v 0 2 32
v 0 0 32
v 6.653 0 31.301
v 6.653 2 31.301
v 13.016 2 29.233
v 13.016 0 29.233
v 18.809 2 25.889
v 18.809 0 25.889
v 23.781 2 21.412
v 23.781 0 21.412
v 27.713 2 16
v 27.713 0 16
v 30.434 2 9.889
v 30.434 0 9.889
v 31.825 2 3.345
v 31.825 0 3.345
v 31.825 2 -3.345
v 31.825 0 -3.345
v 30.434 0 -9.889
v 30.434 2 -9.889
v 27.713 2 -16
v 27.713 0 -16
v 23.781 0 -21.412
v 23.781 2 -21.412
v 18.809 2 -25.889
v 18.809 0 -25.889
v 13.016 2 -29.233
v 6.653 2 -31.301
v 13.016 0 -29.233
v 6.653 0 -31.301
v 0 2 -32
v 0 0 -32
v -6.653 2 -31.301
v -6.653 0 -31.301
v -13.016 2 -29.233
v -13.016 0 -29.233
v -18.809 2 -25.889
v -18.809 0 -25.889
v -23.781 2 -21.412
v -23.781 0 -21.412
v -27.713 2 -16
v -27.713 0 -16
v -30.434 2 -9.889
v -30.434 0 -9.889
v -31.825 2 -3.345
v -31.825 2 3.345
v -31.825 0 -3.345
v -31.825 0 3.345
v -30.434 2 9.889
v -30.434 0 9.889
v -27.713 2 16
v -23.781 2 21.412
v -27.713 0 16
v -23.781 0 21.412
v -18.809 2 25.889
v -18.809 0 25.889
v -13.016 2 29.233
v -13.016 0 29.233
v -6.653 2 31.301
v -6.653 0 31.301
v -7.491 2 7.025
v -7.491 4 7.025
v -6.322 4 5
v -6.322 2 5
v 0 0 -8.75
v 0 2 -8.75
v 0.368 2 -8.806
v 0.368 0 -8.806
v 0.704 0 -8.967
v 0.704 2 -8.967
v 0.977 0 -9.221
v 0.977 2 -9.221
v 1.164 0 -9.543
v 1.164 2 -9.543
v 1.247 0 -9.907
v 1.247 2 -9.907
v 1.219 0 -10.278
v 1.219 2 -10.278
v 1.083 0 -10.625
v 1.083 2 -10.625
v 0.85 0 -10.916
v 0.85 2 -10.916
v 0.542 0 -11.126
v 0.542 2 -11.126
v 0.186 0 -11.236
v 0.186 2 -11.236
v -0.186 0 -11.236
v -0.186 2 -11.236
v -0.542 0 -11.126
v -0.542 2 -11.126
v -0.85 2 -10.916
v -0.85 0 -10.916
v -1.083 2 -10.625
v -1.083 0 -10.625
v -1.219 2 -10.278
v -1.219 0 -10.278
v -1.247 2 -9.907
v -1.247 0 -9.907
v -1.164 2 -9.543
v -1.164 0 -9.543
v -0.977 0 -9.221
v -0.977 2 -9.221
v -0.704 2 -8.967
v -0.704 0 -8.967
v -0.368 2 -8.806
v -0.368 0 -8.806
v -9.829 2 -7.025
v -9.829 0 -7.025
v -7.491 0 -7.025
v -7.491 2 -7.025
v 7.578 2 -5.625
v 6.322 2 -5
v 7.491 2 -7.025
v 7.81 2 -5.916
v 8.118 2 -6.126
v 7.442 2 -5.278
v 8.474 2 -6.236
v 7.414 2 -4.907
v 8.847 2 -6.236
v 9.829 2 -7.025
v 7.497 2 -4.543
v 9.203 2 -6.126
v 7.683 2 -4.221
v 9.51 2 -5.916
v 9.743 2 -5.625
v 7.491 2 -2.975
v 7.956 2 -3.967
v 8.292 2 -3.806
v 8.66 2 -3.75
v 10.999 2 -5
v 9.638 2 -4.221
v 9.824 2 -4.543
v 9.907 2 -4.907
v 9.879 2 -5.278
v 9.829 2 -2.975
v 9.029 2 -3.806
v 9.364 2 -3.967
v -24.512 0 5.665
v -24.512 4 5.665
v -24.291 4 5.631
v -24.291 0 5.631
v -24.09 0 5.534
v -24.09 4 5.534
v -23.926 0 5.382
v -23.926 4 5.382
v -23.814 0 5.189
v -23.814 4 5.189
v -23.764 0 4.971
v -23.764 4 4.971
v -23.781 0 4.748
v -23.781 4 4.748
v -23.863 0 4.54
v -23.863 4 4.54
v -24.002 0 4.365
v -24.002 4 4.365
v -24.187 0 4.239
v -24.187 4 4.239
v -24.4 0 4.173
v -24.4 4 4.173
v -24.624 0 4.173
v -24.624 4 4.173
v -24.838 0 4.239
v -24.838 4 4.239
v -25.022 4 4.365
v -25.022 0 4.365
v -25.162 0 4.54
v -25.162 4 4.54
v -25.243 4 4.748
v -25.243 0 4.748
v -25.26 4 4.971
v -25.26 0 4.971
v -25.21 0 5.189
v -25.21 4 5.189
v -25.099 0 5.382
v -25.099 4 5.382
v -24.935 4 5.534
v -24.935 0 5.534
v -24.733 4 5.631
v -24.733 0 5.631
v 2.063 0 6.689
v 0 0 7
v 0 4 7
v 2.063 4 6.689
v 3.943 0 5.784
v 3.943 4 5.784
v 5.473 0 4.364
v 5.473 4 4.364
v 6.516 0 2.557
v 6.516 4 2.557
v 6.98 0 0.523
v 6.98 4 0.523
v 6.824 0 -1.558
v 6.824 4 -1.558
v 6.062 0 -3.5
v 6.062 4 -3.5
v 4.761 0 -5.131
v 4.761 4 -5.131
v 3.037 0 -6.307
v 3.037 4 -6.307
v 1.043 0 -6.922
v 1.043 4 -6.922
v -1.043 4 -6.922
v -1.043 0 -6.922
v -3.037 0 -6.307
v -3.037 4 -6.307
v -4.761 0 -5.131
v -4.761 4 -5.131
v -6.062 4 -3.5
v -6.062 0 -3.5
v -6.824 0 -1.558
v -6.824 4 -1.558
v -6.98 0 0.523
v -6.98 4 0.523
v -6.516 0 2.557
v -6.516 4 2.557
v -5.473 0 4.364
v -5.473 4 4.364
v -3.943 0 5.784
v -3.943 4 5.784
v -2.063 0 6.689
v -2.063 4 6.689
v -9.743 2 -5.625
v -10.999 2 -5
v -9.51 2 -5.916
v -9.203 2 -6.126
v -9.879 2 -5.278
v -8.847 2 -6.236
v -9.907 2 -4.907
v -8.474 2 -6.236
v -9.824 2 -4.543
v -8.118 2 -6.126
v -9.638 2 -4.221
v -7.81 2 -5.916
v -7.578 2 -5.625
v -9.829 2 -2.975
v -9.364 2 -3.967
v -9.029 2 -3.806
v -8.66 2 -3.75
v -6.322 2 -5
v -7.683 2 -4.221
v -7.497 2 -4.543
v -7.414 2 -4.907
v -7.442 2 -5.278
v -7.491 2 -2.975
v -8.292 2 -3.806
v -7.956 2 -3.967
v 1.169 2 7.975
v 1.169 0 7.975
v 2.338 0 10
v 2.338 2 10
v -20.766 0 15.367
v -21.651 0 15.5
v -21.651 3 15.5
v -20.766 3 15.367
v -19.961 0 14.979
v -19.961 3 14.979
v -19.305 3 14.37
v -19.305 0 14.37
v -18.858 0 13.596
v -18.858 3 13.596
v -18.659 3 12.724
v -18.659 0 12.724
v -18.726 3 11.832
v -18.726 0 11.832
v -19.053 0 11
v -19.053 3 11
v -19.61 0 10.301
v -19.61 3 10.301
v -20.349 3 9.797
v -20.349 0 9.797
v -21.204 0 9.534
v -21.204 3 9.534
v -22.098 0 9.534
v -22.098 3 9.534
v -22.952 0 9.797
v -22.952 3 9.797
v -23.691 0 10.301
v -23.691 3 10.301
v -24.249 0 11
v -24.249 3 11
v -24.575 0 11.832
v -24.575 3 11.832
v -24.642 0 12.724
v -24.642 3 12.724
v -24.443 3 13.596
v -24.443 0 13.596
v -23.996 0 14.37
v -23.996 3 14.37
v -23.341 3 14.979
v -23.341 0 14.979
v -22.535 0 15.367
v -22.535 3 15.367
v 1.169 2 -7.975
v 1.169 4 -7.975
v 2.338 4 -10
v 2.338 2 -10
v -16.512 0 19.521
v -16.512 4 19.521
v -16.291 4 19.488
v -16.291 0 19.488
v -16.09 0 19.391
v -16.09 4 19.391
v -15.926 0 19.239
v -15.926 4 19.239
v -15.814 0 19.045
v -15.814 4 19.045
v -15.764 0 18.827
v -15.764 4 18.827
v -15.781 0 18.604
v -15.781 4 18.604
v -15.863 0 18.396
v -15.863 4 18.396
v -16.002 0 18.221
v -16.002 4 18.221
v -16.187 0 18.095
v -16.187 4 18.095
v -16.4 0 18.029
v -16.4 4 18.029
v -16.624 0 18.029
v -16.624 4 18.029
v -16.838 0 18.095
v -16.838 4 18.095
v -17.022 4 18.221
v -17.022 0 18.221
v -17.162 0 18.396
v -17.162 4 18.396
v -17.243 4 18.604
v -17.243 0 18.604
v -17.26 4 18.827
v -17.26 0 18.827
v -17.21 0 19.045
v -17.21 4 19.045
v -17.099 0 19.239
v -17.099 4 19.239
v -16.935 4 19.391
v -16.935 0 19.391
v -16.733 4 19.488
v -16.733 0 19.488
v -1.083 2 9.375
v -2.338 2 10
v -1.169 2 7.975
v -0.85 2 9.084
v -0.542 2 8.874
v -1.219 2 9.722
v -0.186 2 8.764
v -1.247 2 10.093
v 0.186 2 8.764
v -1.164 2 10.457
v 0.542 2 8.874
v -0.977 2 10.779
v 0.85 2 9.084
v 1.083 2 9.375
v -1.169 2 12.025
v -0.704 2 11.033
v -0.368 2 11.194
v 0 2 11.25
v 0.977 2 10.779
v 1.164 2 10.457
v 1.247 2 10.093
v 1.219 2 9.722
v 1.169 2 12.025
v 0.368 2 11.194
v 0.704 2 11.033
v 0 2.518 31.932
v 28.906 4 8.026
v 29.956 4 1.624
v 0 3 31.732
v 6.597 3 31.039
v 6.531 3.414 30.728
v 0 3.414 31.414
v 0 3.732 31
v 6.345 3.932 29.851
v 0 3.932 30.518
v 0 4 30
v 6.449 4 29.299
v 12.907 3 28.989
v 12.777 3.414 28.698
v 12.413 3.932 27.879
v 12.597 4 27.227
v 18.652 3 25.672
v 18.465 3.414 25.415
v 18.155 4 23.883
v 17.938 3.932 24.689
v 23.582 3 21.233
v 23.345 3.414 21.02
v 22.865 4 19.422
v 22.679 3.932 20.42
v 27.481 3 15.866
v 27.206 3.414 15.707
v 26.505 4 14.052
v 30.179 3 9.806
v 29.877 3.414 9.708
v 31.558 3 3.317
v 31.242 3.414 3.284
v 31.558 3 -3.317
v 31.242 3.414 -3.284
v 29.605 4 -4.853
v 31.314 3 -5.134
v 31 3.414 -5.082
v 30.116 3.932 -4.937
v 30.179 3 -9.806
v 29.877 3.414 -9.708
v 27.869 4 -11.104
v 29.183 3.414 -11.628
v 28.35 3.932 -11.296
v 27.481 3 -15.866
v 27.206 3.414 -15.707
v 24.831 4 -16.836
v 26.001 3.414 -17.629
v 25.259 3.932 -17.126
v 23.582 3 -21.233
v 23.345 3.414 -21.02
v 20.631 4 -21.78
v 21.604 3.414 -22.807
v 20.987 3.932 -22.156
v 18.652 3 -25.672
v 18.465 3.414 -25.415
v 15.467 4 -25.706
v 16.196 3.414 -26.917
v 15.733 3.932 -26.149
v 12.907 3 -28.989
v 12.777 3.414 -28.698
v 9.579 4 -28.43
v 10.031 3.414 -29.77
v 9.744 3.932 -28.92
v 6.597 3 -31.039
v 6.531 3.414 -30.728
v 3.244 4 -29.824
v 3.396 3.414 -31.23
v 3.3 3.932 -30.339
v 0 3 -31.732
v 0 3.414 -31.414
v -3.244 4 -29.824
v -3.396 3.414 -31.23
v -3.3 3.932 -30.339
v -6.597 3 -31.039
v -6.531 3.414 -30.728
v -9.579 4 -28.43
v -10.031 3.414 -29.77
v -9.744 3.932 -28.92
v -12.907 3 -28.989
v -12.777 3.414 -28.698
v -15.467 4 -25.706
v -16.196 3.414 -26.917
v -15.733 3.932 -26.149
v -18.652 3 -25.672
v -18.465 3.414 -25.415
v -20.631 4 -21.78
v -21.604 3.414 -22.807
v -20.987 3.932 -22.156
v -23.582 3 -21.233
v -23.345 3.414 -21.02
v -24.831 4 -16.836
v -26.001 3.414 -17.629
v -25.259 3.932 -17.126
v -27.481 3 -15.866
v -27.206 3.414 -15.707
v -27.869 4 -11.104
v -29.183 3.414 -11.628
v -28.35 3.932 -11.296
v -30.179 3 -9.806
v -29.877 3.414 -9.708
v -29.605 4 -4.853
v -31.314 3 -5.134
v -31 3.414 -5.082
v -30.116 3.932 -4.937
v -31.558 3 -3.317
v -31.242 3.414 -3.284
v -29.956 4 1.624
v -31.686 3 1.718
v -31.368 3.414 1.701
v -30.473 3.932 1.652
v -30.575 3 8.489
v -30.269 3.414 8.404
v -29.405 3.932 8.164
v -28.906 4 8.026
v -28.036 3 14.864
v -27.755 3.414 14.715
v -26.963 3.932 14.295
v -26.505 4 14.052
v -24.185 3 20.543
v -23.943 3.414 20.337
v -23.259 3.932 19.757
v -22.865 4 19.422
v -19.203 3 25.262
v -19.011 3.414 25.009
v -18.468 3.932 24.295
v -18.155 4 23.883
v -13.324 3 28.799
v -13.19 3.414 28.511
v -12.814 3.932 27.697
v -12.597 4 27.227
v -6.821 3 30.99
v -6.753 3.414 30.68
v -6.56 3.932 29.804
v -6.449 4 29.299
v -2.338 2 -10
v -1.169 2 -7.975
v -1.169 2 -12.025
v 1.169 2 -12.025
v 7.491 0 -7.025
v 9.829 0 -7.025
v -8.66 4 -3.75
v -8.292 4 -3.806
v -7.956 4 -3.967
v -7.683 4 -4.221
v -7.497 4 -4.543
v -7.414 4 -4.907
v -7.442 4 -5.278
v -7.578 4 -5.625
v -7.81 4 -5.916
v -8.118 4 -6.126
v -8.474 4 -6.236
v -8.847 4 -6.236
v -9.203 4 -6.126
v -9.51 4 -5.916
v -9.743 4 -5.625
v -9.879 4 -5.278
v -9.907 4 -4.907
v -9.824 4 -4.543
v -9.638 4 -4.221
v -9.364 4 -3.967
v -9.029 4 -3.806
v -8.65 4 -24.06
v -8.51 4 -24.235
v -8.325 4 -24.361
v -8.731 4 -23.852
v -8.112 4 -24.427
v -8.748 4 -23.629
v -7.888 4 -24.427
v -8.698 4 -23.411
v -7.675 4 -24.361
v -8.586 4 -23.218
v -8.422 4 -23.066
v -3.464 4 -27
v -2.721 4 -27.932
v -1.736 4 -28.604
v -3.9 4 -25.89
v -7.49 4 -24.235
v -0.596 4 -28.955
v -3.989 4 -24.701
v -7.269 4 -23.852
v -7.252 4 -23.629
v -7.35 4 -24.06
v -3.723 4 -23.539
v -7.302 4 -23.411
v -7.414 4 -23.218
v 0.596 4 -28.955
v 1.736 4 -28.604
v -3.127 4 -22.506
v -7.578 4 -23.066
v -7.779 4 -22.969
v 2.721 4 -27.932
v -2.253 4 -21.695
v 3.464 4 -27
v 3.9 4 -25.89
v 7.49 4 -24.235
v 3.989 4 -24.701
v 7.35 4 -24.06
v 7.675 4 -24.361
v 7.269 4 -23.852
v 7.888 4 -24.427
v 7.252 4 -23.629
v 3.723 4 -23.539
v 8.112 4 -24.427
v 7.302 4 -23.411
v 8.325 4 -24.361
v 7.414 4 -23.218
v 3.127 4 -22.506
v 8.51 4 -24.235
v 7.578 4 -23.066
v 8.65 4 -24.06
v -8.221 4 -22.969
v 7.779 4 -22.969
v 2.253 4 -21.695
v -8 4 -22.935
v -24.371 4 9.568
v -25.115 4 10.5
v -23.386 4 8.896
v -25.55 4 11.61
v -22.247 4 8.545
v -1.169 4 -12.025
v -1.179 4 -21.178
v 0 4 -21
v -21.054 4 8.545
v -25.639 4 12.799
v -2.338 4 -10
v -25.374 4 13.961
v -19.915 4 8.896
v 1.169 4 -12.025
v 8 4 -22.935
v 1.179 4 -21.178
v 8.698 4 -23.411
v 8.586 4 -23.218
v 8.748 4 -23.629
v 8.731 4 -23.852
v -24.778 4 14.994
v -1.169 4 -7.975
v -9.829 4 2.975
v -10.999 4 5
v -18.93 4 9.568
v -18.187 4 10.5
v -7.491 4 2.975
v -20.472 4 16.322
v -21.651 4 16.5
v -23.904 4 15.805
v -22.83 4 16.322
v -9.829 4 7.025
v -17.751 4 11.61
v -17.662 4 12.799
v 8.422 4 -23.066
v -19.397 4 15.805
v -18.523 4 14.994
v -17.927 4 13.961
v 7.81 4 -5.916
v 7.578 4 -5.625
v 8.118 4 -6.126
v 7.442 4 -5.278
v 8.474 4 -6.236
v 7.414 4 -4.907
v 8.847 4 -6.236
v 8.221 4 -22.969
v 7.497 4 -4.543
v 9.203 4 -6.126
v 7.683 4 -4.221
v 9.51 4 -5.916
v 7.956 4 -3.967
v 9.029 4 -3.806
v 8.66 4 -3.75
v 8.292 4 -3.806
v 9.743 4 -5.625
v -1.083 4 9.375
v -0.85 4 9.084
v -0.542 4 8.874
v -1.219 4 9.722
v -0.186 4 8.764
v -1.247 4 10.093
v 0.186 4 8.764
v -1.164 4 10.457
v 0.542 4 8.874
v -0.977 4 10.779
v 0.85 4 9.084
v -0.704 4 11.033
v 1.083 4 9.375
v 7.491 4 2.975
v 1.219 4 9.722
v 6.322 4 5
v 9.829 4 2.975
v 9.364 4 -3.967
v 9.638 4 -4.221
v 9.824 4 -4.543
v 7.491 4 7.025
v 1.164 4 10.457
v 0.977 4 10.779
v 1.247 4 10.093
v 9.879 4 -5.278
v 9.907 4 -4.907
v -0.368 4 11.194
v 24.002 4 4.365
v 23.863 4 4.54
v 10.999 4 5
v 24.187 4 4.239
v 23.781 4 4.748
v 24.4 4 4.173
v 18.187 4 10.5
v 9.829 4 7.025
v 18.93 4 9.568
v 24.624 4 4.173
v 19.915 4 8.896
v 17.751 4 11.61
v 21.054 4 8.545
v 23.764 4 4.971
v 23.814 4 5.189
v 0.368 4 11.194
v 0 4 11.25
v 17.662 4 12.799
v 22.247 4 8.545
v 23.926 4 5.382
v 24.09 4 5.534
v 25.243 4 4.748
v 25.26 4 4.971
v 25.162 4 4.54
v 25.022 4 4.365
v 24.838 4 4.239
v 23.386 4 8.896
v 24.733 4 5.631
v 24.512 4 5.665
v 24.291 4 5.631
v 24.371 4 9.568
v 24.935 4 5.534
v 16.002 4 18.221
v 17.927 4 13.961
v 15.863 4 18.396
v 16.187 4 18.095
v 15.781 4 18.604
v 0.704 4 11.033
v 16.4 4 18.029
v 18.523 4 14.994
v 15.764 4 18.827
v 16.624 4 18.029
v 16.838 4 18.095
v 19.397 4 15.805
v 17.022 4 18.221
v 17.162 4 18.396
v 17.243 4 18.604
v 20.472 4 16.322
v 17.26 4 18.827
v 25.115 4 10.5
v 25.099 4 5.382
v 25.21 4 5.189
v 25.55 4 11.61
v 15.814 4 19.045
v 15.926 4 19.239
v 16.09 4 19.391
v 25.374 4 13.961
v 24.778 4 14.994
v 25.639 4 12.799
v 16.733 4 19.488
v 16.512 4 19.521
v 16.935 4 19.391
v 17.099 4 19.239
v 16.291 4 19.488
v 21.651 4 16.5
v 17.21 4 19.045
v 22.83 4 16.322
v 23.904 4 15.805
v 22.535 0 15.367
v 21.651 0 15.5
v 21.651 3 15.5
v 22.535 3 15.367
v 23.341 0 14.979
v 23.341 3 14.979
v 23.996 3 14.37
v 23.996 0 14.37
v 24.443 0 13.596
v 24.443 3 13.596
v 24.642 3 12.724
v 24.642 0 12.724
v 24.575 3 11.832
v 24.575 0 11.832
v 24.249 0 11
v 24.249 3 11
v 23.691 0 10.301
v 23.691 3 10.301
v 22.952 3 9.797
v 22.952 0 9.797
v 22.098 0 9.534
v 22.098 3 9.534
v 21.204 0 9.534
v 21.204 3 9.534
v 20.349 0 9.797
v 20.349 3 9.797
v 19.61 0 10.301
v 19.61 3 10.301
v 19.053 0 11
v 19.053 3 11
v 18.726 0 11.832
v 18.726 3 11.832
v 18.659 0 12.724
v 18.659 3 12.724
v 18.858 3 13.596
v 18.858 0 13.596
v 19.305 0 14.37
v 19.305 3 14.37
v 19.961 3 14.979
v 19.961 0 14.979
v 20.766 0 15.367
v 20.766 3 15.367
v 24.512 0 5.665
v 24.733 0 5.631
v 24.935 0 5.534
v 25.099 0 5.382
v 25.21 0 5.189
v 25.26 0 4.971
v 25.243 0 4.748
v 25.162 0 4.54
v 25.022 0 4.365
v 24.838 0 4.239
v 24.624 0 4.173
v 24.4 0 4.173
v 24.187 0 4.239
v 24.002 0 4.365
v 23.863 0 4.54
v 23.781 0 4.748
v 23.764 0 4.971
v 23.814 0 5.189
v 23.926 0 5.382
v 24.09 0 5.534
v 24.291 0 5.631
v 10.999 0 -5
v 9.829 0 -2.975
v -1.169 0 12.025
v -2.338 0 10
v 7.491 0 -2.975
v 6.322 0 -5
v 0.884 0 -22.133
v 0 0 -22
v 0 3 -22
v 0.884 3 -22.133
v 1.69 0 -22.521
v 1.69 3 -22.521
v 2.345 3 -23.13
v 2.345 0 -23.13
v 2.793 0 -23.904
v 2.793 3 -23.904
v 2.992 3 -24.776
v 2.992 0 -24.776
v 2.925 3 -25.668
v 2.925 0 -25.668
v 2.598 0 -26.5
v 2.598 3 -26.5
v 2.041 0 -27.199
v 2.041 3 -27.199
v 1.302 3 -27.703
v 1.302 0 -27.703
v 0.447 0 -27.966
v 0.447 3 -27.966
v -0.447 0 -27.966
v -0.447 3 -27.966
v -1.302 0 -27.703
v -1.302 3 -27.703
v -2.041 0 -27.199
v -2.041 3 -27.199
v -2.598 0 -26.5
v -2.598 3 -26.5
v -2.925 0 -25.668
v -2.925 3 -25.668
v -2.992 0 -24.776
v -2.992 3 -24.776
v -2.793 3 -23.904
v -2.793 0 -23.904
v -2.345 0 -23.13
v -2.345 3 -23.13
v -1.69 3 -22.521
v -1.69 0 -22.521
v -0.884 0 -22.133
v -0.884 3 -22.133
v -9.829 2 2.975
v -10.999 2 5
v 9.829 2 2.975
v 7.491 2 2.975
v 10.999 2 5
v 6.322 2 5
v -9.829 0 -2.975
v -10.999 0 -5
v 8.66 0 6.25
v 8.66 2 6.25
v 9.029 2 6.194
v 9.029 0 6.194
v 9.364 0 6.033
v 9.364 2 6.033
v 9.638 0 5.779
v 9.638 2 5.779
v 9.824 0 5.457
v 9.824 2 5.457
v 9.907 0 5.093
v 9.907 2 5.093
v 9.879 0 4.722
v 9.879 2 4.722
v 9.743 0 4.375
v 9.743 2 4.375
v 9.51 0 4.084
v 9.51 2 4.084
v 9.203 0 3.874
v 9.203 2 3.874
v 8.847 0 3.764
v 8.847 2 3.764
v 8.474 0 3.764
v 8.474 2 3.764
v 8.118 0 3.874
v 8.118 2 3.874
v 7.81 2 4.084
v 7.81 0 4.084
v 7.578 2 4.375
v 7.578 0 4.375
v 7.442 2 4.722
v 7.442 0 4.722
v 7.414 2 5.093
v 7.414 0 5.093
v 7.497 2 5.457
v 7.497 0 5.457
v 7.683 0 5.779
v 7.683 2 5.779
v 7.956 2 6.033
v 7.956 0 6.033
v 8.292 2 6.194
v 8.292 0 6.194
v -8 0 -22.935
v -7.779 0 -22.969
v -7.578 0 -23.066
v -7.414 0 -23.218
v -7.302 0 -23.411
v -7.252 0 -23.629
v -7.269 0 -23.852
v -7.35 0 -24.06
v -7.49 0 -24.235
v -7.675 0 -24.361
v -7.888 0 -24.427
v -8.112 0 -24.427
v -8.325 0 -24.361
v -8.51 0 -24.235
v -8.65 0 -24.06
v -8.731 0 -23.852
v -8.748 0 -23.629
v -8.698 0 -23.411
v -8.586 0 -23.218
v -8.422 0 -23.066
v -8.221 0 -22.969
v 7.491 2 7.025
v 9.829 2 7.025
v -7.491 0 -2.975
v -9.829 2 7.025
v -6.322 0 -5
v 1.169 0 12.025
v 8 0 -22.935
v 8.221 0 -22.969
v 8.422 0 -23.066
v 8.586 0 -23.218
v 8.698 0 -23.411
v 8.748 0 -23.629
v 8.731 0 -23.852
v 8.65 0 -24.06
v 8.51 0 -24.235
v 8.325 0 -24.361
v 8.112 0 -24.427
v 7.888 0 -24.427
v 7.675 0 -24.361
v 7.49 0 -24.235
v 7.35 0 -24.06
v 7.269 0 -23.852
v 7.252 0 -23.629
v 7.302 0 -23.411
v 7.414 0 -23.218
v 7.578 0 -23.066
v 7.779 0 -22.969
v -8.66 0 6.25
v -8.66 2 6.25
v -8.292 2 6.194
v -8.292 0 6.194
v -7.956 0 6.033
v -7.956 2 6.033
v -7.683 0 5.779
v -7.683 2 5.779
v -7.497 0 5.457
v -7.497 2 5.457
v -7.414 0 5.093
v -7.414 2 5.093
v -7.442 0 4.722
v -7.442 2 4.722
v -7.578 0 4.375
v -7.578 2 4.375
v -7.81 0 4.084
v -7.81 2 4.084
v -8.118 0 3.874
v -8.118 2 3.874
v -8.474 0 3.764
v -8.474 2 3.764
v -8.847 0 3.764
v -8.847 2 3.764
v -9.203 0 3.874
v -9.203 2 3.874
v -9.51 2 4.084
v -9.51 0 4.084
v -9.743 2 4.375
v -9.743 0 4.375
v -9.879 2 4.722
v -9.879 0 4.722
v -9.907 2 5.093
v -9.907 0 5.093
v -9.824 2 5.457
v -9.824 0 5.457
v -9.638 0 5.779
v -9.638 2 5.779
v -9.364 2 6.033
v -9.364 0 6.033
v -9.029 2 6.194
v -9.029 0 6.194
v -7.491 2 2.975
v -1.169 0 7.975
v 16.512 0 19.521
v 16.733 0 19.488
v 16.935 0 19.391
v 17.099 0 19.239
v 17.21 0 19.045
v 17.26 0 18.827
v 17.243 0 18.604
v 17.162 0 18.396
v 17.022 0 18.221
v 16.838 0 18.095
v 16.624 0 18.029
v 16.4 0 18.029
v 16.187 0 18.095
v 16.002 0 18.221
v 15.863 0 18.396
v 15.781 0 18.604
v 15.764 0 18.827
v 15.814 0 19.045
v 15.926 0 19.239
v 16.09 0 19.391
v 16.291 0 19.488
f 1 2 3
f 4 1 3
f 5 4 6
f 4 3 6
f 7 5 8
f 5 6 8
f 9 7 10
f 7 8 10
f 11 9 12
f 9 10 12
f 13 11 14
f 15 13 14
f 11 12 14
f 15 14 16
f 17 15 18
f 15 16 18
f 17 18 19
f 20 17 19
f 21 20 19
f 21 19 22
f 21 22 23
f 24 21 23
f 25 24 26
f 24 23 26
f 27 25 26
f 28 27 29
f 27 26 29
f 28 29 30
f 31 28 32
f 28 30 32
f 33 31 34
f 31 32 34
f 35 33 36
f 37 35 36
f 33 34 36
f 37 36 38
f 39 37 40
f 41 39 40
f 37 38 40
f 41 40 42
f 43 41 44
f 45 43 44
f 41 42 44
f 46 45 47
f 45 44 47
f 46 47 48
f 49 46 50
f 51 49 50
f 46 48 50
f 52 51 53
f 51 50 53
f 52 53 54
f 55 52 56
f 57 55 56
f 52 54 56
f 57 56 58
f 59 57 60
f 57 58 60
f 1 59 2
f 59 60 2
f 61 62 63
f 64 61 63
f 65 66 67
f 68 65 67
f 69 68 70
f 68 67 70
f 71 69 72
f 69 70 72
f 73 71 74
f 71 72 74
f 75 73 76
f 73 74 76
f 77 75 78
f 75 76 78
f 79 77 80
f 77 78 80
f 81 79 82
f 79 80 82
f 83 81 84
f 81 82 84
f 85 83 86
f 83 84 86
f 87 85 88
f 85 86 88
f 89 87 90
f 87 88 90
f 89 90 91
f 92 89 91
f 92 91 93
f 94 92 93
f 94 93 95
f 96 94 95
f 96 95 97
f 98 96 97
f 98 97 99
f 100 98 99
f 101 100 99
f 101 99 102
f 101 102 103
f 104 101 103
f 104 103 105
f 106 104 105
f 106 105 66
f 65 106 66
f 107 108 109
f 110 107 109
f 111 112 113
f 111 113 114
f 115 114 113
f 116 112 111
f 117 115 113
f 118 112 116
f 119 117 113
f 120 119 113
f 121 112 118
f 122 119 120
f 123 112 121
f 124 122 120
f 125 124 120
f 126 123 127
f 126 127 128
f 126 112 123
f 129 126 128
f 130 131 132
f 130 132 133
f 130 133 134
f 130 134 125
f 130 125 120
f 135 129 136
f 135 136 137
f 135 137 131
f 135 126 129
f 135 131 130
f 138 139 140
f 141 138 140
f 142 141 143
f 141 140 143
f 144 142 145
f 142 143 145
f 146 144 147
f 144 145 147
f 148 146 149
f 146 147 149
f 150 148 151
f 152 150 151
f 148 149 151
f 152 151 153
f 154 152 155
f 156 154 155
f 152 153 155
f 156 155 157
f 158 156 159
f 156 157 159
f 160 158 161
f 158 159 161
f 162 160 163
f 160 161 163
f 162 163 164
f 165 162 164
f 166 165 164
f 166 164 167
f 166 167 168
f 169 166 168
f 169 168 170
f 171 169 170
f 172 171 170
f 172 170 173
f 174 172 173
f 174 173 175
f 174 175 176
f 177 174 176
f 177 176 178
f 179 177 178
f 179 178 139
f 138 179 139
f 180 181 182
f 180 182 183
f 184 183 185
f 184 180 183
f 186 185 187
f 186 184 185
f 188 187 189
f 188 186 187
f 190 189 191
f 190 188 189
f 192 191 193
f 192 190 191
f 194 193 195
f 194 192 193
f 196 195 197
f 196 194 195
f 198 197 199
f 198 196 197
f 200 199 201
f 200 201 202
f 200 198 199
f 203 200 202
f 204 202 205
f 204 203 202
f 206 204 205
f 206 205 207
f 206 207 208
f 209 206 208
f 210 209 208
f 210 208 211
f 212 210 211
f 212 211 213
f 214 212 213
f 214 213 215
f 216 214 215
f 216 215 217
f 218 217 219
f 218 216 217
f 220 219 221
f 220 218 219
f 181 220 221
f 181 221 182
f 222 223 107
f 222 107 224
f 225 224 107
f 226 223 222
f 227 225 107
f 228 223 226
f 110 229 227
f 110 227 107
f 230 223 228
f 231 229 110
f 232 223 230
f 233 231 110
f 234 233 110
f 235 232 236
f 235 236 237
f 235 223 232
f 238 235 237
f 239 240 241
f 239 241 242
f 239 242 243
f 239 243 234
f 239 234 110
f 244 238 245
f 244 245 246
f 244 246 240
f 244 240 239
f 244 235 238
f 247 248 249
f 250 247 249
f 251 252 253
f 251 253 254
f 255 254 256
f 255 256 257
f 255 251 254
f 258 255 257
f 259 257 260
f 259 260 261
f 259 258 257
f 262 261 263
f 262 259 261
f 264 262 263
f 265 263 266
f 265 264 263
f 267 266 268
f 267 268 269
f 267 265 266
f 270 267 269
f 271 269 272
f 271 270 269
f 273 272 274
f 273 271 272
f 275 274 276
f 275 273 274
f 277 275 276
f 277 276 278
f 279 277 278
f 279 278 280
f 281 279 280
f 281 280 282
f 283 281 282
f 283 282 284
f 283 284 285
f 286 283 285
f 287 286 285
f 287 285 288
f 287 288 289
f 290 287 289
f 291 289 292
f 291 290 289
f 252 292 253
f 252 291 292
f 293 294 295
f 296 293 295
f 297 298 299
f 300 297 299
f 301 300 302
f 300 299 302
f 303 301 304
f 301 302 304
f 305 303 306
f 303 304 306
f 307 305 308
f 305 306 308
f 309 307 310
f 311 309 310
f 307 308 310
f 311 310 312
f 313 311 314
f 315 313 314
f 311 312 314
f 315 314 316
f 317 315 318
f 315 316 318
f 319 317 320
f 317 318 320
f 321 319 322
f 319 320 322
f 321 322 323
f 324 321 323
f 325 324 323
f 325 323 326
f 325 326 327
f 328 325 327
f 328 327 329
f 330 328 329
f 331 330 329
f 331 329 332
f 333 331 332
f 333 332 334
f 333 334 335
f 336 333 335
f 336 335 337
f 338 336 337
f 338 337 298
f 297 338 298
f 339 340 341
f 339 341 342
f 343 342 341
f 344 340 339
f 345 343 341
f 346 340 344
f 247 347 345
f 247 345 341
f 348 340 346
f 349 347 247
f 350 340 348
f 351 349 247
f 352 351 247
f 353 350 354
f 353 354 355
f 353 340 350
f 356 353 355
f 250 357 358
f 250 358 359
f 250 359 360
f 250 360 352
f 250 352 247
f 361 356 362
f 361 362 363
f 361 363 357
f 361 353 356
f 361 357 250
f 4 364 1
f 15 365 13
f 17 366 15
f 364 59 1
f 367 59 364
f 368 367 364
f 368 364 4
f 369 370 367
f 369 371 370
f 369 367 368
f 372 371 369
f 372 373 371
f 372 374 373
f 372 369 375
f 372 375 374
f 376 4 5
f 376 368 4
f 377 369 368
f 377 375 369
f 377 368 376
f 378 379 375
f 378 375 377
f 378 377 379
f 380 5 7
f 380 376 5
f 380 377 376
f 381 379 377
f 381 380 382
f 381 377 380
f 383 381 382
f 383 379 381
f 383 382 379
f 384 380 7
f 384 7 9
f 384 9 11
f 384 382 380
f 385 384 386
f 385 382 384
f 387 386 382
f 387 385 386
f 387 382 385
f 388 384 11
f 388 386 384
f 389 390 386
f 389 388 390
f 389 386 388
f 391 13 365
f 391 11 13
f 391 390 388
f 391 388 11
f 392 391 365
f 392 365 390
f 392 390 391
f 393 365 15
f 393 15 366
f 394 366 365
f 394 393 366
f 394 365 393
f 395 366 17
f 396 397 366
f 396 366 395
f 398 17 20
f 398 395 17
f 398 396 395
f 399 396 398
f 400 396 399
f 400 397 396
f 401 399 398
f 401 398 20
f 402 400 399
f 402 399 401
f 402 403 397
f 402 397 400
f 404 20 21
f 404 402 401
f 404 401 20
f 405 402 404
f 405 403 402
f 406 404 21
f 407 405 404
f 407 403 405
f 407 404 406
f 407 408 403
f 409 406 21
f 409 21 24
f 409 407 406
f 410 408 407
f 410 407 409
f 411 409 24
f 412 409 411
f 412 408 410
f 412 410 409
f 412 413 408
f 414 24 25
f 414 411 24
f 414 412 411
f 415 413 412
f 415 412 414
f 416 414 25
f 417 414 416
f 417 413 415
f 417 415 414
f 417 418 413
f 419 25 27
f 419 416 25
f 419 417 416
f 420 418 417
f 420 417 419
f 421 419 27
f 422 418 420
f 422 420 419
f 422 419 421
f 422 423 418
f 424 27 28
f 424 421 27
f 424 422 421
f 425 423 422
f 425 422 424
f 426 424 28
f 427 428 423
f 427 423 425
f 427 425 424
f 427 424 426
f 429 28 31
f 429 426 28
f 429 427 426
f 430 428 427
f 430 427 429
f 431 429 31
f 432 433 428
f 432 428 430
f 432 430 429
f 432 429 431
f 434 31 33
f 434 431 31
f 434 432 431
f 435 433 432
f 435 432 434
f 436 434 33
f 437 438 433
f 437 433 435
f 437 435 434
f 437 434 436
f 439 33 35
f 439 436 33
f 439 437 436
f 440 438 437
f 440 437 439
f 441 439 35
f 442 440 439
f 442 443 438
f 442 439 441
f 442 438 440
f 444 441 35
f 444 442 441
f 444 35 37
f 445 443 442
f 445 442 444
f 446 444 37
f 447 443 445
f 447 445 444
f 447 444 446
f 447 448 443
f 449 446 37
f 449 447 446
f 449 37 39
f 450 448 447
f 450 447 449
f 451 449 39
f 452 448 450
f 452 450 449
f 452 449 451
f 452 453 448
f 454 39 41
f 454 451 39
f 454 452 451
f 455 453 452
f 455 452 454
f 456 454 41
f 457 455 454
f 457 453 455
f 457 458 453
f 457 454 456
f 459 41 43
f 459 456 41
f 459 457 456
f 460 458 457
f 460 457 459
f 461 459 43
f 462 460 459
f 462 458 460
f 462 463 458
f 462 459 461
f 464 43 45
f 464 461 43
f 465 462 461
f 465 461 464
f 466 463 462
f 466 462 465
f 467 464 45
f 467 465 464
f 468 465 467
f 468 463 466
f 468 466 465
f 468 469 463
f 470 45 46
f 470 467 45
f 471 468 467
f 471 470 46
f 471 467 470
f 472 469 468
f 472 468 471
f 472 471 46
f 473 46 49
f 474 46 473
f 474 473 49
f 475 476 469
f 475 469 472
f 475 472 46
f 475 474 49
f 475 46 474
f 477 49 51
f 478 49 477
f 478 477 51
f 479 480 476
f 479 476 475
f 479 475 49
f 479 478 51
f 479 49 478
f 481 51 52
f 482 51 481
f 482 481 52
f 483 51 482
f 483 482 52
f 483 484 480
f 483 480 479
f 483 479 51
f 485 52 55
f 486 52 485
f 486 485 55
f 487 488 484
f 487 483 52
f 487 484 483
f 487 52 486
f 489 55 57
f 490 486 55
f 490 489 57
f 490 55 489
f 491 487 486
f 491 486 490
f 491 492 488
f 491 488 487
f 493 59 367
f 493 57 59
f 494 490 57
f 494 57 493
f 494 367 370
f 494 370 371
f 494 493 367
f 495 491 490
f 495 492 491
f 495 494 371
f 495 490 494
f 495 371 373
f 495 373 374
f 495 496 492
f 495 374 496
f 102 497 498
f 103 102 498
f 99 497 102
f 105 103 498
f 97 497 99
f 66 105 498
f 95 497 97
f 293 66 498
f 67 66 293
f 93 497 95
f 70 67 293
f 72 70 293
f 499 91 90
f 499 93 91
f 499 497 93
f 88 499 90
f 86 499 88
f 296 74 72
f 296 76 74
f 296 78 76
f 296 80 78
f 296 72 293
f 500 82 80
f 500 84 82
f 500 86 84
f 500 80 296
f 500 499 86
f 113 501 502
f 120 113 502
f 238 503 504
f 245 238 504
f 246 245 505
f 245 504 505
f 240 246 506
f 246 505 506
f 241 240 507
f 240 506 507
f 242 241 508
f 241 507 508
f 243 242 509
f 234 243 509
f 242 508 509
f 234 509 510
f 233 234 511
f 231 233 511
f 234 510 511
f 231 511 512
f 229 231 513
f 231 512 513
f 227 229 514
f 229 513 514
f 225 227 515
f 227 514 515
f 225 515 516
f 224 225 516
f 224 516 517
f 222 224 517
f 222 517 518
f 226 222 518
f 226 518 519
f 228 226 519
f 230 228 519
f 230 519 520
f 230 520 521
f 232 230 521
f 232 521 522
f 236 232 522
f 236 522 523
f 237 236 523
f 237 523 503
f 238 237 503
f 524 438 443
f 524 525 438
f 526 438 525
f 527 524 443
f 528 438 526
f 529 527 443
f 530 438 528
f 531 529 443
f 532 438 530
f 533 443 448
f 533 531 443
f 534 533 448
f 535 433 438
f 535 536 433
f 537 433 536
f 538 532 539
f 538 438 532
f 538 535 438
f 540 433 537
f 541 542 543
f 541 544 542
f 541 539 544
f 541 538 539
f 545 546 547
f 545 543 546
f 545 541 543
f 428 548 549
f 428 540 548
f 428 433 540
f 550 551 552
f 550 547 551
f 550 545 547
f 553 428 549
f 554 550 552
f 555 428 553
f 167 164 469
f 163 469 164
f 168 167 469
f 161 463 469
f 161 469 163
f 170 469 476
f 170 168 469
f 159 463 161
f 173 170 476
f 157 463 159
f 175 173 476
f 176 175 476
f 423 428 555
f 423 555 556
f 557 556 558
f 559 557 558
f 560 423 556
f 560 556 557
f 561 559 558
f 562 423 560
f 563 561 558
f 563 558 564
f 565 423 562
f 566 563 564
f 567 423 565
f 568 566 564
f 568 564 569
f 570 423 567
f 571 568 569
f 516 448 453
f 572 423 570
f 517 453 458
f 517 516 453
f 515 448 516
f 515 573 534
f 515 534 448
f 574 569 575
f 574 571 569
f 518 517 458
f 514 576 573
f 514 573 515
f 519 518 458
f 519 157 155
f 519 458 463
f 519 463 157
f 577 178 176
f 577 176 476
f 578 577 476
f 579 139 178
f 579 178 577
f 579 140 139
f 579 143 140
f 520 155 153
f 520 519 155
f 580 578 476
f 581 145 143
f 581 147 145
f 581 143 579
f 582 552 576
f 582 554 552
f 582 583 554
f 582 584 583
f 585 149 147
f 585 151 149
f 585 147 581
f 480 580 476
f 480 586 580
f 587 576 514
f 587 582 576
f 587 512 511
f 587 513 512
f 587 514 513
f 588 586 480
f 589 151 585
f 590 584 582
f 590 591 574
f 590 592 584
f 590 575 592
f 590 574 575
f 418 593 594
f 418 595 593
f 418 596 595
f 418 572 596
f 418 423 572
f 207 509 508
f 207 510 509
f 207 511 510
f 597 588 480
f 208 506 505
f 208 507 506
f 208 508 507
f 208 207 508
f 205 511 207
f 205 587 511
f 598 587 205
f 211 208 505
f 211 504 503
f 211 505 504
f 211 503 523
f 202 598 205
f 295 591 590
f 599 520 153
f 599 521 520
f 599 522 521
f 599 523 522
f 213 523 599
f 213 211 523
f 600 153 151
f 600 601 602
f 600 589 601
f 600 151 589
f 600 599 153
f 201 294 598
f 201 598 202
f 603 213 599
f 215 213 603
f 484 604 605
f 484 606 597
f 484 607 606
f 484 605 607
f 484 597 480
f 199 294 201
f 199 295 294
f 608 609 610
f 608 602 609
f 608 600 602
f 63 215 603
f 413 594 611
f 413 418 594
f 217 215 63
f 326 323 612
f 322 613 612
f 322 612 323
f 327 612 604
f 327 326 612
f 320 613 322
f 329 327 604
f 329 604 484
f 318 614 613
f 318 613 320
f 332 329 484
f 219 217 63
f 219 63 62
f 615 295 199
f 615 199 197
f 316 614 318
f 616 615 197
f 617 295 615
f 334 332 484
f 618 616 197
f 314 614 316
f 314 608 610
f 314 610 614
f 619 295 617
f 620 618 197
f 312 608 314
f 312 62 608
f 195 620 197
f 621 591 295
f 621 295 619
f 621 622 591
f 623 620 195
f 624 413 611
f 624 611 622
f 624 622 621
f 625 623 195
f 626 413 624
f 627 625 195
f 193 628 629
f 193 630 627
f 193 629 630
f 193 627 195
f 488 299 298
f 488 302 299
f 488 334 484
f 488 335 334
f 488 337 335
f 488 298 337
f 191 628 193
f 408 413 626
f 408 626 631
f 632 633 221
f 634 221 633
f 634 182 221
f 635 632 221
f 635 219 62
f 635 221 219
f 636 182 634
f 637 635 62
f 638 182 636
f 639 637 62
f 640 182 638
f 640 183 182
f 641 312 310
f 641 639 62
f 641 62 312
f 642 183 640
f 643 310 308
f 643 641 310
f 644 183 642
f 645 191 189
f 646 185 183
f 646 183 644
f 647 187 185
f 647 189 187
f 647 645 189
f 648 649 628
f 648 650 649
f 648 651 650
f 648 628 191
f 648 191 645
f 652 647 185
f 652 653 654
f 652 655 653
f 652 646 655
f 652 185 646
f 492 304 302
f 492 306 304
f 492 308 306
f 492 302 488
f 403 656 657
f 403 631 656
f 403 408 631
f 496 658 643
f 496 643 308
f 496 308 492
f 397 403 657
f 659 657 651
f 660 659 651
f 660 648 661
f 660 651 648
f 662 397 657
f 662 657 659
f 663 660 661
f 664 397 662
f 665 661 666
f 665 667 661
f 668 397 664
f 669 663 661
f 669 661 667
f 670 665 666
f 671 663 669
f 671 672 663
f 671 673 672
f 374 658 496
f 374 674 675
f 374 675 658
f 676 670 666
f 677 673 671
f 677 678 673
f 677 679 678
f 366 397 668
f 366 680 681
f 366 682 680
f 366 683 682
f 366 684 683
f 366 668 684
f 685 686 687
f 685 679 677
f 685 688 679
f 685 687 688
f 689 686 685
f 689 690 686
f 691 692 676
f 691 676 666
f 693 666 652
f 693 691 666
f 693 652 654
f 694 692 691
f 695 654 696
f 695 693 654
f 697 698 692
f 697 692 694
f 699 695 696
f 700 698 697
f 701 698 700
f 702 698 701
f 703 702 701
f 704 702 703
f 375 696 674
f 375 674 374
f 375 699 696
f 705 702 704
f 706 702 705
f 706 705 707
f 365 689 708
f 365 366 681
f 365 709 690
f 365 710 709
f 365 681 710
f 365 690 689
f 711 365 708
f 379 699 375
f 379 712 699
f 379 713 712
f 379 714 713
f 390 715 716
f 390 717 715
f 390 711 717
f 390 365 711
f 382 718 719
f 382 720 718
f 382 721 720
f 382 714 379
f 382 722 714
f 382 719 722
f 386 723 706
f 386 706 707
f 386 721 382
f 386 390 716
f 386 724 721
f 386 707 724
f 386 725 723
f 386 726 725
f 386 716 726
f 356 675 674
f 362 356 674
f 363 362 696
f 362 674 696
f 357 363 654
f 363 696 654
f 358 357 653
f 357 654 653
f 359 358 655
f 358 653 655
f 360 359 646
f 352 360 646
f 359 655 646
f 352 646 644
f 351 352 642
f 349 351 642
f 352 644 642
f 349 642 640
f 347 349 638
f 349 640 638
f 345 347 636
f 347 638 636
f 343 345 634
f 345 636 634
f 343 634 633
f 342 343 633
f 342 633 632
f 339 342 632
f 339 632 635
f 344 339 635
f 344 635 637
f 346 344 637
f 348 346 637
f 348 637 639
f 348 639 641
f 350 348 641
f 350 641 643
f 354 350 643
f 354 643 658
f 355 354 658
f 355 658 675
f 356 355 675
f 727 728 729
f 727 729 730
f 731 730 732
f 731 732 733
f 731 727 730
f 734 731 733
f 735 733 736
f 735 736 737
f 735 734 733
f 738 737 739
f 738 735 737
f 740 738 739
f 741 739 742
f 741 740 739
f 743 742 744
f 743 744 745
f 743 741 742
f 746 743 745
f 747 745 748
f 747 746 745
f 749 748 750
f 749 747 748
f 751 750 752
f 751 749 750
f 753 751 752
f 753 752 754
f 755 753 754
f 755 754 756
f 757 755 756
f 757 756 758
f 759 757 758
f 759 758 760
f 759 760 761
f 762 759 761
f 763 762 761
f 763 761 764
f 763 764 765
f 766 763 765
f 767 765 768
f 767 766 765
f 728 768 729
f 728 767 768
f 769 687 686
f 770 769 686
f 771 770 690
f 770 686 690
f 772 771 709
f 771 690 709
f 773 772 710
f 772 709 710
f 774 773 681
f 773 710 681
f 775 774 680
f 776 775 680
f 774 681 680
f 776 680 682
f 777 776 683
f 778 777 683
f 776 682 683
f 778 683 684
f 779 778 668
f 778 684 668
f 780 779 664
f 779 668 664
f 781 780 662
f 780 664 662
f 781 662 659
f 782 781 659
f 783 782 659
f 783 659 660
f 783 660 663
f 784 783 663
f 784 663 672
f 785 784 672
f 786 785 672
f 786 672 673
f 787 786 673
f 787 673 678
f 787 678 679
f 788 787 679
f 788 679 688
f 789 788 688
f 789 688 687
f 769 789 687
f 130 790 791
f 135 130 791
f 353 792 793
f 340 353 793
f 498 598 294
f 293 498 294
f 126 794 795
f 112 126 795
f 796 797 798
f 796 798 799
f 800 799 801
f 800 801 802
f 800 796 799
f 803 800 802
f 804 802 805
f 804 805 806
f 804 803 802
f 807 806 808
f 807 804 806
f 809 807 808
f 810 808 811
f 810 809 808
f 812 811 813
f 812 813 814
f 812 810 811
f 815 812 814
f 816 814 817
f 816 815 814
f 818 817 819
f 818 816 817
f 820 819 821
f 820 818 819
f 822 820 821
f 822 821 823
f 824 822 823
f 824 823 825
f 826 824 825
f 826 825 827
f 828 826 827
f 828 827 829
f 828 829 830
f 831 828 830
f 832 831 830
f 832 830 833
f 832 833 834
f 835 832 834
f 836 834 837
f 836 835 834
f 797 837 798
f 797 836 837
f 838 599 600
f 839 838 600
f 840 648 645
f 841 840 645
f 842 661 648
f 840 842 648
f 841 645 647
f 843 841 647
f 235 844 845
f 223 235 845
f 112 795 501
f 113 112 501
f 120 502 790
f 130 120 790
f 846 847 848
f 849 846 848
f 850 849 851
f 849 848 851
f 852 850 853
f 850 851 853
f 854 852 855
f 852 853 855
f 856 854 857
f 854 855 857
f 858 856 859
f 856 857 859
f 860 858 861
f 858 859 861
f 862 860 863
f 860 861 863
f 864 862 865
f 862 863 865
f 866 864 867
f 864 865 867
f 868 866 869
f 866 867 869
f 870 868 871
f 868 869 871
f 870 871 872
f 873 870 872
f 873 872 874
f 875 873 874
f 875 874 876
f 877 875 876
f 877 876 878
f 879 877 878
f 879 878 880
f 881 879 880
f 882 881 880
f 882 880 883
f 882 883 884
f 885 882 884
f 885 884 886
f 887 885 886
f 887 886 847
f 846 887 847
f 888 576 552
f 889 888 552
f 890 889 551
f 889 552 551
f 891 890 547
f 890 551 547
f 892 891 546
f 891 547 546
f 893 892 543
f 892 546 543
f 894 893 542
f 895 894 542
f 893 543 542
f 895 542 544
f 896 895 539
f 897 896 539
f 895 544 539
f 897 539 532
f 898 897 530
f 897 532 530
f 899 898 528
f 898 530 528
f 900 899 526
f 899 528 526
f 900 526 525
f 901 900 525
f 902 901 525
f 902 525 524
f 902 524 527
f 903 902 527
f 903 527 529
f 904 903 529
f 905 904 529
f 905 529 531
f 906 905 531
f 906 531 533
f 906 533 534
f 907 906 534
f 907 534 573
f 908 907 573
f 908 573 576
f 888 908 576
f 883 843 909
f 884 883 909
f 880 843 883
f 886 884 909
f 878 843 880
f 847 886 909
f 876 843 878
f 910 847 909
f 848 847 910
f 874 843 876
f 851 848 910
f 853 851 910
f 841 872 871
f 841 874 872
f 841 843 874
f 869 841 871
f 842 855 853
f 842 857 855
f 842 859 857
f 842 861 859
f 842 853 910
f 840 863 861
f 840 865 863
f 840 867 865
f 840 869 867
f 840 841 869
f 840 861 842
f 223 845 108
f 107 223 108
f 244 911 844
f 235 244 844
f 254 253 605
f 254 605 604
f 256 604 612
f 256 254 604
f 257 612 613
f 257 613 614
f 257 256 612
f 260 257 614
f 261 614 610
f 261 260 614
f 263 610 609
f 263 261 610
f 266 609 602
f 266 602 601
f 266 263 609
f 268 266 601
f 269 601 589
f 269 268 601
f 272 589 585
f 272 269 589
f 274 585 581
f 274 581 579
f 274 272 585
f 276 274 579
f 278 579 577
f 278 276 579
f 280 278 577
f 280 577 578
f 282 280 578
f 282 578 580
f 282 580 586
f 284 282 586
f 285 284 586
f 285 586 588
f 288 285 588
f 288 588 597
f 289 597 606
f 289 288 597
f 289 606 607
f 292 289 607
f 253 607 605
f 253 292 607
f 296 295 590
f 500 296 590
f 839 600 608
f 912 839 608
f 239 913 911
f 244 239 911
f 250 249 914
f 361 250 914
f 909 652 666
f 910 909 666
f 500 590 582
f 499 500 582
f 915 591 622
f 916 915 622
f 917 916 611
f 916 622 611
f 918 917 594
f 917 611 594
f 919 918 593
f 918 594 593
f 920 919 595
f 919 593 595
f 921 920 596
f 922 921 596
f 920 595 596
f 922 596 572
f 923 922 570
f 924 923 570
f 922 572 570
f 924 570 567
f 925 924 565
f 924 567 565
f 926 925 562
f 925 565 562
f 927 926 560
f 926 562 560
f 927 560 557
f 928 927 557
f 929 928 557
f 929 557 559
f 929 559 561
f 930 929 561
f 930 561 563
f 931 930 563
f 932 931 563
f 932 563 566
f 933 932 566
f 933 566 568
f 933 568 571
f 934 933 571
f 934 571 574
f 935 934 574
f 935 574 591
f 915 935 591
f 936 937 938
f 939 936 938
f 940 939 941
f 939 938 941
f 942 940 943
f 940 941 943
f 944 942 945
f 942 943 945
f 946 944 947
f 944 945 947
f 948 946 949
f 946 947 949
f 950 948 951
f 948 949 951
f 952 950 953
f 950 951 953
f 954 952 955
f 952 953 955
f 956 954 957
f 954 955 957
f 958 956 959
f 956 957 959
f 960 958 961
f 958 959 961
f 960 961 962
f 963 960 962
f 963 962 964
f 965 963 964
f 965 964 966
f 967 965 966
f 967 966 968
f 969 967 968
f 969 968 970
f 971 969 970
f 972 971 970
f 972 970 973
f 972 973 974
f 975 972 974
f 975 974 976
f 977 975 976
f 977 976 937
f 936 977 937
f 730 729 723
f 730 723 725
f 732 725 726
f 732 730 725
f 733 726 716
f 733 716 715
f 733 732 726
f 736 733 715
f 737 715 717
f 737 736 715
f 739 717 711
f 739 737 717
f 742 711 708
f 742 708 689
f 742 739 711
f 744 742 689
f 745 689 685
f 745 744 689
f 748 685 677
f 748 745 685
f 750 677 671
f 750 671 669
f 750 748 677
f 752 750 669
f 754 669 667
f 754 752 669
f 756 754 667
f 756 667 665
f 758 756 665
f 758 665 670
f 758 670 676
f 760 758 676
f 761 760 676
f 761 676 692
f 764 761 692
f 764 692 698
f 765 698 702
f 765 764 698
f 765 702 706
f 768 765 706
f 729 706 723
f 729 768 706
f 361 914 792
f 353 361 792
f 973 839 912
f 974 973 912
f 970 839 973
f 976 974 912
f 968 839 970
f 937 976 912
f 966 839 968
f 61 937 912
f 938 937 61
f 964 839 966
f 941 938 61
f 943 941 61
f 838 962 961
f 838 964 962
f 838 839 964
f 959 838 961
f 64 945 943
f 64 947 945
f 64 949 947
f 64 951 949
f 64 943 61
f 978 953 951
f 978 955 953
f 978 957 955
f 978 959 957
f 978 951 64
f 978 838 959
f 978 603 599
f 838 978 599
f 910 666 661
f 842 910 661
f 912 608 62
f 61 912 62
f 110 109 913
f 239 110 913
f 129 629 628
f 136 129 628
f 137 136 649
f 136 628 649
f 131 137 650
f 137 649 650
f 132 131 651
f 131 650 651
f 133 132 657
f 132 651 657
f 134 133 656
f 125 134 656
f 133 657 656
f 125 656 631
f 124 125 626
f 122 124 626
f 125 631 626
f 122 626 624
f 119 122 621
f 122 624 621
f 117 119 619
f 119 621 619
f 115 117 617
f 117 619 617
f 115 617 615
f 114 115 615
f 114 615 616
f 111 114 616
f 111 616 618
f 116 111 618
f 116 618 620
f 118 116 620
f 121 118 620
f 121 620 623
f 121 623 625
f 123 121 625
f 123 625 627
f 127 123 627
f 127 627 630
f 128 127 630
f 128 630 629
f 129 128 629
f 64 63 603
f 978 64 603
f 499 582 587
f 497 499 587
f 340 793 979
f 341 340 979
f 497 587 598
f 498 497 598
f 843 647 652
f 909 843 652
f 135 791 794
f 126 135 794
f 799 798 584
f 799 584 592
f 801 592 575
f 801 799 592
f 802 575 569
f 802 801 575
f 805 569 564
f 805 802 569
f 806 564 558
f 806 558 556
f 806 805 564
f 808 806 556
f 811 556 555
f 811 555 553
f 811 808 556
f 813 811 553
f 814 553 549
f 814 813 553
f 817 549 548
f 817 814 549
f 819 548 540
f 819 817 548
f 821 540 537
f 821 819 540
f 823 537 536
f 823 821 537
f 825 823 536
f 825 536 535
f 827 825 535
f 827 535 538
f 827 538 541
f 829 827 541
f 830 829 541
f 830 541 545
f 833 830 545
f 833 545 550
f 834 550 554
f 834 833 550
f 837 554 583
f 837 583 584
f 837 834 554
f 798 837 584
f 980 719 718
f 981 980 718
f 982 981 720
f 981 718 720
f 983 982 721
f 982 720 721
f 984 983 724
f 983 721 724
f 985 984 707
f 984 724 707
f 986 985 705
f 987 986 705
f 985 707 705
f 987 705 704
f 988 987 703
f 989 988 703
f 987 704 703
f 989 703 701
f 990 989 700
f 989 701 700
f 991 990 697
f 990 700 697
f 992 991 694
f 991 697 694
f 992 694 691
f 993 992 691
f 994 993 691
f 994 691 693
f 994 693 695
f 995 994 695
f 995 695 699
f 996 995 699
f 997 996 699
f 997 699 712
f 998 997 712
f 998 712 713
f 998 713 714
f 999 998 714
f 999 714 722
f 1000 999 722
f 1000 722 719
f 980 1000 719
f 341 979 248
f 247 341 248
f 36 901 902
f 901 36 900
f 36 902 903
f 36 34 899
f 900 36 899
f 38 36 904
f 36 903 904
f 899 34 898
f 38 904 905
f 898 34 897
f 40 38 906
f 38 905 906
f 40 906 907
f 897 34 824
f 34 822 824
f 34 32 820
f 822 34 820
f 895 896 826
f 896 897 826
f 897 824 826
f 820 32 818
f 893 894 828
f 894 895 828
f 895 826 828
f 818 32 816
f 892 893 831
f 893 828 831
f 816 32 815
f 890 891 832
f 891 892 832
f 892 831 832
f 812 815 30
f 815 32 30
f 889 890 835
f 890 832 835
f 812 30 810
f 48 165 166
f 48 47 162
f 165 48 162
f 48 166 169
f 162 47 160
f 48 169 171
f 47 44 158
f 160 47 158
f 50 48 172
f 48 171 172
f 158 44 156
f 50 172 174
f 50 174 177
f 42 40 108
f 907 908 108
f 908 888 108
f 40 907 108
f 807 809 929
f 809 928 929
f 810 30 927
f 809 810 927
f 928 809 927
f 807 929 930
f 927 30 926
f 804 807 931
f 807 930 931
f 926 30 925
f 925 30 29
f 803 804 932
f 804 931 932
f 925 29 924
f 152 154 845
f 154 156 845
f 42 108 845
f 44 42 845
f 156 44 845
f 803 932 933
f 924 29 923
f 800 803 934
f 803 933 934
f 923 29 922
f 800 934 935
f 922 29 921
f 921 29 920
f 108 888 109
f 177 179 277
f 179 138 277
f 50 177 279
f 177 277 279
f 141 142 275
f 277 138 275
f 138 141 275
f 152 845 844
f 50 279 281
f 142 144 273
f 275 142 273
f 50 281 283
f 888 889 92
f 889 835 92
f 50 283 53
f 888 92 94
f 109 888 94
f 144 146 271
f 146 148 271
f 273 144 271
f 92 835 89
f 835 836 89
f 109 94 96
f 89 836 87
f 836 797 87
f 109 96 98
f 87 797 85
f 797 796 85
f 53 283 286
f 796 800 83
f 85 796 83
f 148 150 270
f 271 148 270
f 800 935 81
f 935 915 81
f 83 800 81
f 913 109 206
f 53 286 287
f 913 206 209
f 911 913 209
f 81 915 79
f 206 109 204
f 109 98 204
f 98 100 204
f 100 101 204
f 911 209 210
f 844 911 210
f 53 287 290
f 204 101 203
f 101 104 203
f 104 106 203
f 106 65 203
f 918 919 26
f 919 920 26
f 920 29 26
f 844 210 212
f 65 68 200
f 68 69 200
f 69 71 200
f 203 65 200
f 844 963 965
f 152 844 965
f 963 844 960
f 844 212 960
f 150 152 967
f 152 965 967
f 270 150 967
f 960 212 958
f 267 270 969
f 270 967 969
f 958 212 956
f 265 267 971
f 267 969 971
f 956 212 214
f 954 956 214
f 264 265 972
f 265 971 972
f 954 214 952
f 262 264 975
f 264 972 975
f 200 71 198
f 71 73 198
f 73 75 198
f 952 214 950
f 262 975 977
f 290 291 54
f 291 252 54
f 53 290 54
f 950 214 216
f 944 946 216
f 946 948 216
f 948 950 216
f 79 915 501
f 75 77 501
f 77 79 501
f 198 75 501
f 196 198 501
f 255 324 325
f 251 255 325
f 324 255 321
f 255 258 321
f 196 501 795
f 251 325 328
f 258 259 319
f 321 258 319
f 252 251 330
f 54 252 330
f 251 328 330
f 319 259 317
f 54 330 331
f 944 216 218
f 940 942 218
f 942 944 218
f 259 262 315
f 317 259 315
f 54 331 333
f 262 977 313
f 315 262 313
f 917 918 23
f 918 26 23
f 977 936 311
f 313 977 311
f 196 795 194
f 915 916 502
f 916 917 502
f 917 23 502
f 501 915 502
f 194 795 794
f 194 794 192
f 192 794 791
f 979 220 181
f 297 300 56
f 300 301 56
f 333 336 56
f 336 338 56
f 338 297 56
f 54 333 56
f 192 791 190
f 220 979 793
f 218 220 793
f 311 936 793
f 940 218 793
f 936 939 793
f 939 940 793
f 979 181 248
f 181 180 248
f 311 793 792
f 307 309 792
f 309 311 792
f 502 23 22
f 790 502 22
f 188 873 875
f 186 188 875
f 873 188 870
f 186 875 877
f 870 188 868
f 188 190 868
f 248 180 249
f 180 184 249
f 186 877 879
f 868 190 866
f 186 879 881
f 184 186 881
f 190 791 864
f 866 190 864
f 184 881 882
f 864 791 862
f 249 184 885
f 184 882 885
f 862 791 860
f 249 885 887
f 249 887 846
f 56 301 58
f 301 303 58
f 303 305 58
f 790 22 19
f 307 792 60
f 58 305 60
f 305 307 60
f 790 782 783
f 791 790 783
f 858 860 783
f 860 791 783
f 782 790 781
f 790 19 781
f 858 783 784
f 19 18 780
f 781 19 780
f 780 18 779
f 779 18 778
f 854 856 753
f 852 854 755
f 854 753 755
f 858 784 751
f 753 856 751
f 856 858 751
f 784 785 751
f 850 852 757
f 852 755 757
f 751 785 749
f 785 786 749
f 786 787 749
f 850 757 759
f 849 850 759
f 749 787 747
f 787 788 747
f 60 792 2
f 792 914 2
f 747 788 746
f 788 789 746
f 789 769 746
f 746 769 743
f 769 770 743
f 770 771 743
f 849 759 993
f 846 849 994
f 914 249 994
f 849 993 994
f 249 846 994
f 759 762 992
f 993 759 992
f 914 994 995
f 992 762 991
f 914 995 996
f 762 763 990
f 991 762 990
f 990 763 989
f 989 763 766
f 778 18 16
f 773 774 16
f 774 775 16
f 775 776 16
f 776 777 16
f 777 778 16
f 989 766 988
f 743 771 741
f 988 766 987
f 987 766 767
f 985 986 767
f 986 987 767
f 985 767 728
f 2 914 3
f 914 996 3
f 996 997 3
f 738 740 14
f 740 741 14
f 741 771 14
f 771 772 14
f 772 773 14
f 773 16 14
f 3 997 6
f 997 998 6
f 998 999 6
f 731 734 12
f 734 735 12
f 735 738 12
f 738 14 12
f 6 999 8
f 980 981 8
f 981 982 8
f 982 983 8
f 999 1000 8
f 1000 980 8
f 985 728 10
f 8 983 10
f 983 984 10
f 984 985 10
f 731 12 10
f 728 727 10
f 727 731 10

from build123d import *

# Parameters (mm, degrees)
SKETCH_1_R          = 32
SKETCH_1_R_2        = 7
SKETCH_1_R_3        = 3
EXTRUDE_1_DEPTH     = 4
FILLET_1_R          = 2
SKETCH_2_R          = 1.25
CUT_EXTRUDE_1_DEPTH = 46.431266766
CUT_EXTRUDE_2_DEPTH = 2
CUT_EXTRUDE_3_DEPTH = 2
CHAMFER_1_SIZE      = 1
SKETCH_5_R          = 0.75
CUT_EXTRUDE_4_DEPTH = 46.431266766


with BuildPart() as part:
    # Эскиз1 → Бобышка-Вытянуть1 (new body)
    with BuildSketch(Plane(origin=(0, 0, 0), x_dir=(1, 0, 0), z_dir=(0, 1, 0))):
        with Locations(Location((0, 0, 0), (0, 0, 270))):
            Circle(SKETCH_1_R)
        with Locations(Location((0, 0, 0), (0, 0, 270))):
            Circle(SKETCH_1_R_2, mode=Mode.SUBTRACT)
        with Locations(Location((0, 25, 0), (0, 0, 270))):
            Circle(SKETCH_1_R_3, mode=Mode.SUBTRACT)
        with Locations(Location((21.650635095, -12.5, 0), (0, 0, 270))):
            Circle(SKETCH_1_R_3, mode=Mode.SUBTRACT)
        with Locations(Location((-21.650635095, -12.5, 0), (0, 0, 270))):
            Circle(SKETCH_1_R_3, mode=Mode.SUBTRACT)
    extrude(amount=EXTRUDE_1_DEPTH)

    # Скругление1
    fillet_1_edges = [part.edges().sort_by_distance(p)[0] for p in [
        (0, 4, -32),
    ]]
    fillet(fillet_1_edges, radius=FILLET_1_R)

    # Эскиз2 → Вырез-Вытянуть1 (cut, through all)
    with BuildSketch(Plane(origin=(0, 4, 0), x_dir=(1, 0, 0), z_dir=(0, 1, 0))):
        with Locations(Location((0, 10, 0), (0, 0, 270))):
            Circle(SKETCH_2_R)
        with Locations(Location((8.660254038, 5, 0), (0, 0, 270))):
            Circle(SKETCH_2_R)
        with Locations(Location((8.660254038, -5, 0), (0, 0, 270))):
            Circle(SKETCH_2_R)
        with Locations(Location((0, -10, 0), (0, 0, 270))):
            Circle(SKETCH_2_R)
        with Locations(Location((-8.660254038, -5, 0), (0, 0, 270))):
            Circle(SKETCH_2_R)
        with Locations(Location((-8.660254038, 5, 0), (0, 0, 270))):
            Circle(SKETCH_2_R)
    extrude(amount=-CUT_EXTRUDE_1_DEPTH, mode=Mode.SUBTRACT)

    # Эскиз3 → Вырез-Вытянуть2 (cut)
    with BuildSketch(Plane(origin=(0, 4, 0), x_dir=(1, 0, 0), z_dir=(0, 1, 0))):
        Polygon((9.829388333, -7.025), (10.998522628, -5), (9.829388333, -2.975), (7.491119743, -2.975), (6.321985448, -5), (7.491119743, -7.025), align=None)
        Polygon((1.169134295, 7.975), (2.33826859, 10), (1.169134295, 12.025), (-1.169134295, 12.025), (-2.33826859, 10), (-1.169134295, 7.975), align=None)
        Polygon((-10.998522628, -5), (-9.829388333, -7.025), (-7.491119743, -7.025), (-6.321985448, -5), (-7.491119743, -2.975), (-9.829388333, -2.975), align=None)
    extrude(amount=-CUT_EXTRUDE_2_DEPTH, mode=Mode.SUBTRACT)

    # Эскиз4 → Вырез-Вытянуть3 (cut)
    with BuildSketch(Plane.XZ):
        Polygon((7.491119743, -7.025), (9.829388333, -7.025), (10.998522628, -5), (9.829388333, -2.975), (7.491119743, -2.975), (6.321985448, -5), align=None)
        Polygon((-1.169134295, 7.975), (1.169134295, 7.975), (2.33826859, 10), (1.169134295, 12.025), (-1.169134295, 12.025), (-2.33826859, 10), align=None)
        Polygon((-9.829388333, -2.975), (-10.998522628, -5), (-9.829388333, -7.025), (-7.491119743, -7.025), (-6.321985448, -5), (-7.491119743, -2.975), align=None)
    extrude(amount=-CUT_EXTRUDE_3_DEPTH, mode=Mode.SUBTRACT)

    # Фаска1
    chamfer_1_edges = [part.edges().sort_by_distance(p)[0] for p in [
        (21.650635095, 4, 9.5),
        (-21.650635095, 4, 9.5),
        (0, 4, -28),
    ]]
    chamfer(chamfer_1_edges, length=CHAMFER_1_SIZE)

    # Эскиз5 → Вырез-Вытянуть4 (cut, through all)
    with BuildSketch(Plane(origin=(0, 4, 0), x_dir=(1, 0, 0), z_dir=(0, 1, 0))):
        with Locations(Location((8, 23.685438565, 0), (0, 0, 270))):
            Circle(SKETCH_5_R)
        with Locations(Location((-8, 23.685438565, 0), (0, 0, 270))):
            Circle(SKETCH_5_R)
        with Locations(Location((24.512191497, -4.914516052, 0), (0, 0, 270))):
            Circle(SKETCH_5_R)
        with Locations(Location((16.512191497, -18.770922513, 0), (0, 0, 270))):
            Circle(SKETCH_5_R)
        with Locations(Location((-16.512191497, -18.770922513, 0), (0, 0, 270))):
            Circle(SKETCH_5_R)
        with Locations(Location((-24.512191497, -4.914516052, 0), (0, 0, 270))):
            Circle(SKETCH_5_R)
    extrude(amount=-CUT_EXTRUDE_4_DEPTH, mode=Mode.SUBTRACT)


solid = part.part
